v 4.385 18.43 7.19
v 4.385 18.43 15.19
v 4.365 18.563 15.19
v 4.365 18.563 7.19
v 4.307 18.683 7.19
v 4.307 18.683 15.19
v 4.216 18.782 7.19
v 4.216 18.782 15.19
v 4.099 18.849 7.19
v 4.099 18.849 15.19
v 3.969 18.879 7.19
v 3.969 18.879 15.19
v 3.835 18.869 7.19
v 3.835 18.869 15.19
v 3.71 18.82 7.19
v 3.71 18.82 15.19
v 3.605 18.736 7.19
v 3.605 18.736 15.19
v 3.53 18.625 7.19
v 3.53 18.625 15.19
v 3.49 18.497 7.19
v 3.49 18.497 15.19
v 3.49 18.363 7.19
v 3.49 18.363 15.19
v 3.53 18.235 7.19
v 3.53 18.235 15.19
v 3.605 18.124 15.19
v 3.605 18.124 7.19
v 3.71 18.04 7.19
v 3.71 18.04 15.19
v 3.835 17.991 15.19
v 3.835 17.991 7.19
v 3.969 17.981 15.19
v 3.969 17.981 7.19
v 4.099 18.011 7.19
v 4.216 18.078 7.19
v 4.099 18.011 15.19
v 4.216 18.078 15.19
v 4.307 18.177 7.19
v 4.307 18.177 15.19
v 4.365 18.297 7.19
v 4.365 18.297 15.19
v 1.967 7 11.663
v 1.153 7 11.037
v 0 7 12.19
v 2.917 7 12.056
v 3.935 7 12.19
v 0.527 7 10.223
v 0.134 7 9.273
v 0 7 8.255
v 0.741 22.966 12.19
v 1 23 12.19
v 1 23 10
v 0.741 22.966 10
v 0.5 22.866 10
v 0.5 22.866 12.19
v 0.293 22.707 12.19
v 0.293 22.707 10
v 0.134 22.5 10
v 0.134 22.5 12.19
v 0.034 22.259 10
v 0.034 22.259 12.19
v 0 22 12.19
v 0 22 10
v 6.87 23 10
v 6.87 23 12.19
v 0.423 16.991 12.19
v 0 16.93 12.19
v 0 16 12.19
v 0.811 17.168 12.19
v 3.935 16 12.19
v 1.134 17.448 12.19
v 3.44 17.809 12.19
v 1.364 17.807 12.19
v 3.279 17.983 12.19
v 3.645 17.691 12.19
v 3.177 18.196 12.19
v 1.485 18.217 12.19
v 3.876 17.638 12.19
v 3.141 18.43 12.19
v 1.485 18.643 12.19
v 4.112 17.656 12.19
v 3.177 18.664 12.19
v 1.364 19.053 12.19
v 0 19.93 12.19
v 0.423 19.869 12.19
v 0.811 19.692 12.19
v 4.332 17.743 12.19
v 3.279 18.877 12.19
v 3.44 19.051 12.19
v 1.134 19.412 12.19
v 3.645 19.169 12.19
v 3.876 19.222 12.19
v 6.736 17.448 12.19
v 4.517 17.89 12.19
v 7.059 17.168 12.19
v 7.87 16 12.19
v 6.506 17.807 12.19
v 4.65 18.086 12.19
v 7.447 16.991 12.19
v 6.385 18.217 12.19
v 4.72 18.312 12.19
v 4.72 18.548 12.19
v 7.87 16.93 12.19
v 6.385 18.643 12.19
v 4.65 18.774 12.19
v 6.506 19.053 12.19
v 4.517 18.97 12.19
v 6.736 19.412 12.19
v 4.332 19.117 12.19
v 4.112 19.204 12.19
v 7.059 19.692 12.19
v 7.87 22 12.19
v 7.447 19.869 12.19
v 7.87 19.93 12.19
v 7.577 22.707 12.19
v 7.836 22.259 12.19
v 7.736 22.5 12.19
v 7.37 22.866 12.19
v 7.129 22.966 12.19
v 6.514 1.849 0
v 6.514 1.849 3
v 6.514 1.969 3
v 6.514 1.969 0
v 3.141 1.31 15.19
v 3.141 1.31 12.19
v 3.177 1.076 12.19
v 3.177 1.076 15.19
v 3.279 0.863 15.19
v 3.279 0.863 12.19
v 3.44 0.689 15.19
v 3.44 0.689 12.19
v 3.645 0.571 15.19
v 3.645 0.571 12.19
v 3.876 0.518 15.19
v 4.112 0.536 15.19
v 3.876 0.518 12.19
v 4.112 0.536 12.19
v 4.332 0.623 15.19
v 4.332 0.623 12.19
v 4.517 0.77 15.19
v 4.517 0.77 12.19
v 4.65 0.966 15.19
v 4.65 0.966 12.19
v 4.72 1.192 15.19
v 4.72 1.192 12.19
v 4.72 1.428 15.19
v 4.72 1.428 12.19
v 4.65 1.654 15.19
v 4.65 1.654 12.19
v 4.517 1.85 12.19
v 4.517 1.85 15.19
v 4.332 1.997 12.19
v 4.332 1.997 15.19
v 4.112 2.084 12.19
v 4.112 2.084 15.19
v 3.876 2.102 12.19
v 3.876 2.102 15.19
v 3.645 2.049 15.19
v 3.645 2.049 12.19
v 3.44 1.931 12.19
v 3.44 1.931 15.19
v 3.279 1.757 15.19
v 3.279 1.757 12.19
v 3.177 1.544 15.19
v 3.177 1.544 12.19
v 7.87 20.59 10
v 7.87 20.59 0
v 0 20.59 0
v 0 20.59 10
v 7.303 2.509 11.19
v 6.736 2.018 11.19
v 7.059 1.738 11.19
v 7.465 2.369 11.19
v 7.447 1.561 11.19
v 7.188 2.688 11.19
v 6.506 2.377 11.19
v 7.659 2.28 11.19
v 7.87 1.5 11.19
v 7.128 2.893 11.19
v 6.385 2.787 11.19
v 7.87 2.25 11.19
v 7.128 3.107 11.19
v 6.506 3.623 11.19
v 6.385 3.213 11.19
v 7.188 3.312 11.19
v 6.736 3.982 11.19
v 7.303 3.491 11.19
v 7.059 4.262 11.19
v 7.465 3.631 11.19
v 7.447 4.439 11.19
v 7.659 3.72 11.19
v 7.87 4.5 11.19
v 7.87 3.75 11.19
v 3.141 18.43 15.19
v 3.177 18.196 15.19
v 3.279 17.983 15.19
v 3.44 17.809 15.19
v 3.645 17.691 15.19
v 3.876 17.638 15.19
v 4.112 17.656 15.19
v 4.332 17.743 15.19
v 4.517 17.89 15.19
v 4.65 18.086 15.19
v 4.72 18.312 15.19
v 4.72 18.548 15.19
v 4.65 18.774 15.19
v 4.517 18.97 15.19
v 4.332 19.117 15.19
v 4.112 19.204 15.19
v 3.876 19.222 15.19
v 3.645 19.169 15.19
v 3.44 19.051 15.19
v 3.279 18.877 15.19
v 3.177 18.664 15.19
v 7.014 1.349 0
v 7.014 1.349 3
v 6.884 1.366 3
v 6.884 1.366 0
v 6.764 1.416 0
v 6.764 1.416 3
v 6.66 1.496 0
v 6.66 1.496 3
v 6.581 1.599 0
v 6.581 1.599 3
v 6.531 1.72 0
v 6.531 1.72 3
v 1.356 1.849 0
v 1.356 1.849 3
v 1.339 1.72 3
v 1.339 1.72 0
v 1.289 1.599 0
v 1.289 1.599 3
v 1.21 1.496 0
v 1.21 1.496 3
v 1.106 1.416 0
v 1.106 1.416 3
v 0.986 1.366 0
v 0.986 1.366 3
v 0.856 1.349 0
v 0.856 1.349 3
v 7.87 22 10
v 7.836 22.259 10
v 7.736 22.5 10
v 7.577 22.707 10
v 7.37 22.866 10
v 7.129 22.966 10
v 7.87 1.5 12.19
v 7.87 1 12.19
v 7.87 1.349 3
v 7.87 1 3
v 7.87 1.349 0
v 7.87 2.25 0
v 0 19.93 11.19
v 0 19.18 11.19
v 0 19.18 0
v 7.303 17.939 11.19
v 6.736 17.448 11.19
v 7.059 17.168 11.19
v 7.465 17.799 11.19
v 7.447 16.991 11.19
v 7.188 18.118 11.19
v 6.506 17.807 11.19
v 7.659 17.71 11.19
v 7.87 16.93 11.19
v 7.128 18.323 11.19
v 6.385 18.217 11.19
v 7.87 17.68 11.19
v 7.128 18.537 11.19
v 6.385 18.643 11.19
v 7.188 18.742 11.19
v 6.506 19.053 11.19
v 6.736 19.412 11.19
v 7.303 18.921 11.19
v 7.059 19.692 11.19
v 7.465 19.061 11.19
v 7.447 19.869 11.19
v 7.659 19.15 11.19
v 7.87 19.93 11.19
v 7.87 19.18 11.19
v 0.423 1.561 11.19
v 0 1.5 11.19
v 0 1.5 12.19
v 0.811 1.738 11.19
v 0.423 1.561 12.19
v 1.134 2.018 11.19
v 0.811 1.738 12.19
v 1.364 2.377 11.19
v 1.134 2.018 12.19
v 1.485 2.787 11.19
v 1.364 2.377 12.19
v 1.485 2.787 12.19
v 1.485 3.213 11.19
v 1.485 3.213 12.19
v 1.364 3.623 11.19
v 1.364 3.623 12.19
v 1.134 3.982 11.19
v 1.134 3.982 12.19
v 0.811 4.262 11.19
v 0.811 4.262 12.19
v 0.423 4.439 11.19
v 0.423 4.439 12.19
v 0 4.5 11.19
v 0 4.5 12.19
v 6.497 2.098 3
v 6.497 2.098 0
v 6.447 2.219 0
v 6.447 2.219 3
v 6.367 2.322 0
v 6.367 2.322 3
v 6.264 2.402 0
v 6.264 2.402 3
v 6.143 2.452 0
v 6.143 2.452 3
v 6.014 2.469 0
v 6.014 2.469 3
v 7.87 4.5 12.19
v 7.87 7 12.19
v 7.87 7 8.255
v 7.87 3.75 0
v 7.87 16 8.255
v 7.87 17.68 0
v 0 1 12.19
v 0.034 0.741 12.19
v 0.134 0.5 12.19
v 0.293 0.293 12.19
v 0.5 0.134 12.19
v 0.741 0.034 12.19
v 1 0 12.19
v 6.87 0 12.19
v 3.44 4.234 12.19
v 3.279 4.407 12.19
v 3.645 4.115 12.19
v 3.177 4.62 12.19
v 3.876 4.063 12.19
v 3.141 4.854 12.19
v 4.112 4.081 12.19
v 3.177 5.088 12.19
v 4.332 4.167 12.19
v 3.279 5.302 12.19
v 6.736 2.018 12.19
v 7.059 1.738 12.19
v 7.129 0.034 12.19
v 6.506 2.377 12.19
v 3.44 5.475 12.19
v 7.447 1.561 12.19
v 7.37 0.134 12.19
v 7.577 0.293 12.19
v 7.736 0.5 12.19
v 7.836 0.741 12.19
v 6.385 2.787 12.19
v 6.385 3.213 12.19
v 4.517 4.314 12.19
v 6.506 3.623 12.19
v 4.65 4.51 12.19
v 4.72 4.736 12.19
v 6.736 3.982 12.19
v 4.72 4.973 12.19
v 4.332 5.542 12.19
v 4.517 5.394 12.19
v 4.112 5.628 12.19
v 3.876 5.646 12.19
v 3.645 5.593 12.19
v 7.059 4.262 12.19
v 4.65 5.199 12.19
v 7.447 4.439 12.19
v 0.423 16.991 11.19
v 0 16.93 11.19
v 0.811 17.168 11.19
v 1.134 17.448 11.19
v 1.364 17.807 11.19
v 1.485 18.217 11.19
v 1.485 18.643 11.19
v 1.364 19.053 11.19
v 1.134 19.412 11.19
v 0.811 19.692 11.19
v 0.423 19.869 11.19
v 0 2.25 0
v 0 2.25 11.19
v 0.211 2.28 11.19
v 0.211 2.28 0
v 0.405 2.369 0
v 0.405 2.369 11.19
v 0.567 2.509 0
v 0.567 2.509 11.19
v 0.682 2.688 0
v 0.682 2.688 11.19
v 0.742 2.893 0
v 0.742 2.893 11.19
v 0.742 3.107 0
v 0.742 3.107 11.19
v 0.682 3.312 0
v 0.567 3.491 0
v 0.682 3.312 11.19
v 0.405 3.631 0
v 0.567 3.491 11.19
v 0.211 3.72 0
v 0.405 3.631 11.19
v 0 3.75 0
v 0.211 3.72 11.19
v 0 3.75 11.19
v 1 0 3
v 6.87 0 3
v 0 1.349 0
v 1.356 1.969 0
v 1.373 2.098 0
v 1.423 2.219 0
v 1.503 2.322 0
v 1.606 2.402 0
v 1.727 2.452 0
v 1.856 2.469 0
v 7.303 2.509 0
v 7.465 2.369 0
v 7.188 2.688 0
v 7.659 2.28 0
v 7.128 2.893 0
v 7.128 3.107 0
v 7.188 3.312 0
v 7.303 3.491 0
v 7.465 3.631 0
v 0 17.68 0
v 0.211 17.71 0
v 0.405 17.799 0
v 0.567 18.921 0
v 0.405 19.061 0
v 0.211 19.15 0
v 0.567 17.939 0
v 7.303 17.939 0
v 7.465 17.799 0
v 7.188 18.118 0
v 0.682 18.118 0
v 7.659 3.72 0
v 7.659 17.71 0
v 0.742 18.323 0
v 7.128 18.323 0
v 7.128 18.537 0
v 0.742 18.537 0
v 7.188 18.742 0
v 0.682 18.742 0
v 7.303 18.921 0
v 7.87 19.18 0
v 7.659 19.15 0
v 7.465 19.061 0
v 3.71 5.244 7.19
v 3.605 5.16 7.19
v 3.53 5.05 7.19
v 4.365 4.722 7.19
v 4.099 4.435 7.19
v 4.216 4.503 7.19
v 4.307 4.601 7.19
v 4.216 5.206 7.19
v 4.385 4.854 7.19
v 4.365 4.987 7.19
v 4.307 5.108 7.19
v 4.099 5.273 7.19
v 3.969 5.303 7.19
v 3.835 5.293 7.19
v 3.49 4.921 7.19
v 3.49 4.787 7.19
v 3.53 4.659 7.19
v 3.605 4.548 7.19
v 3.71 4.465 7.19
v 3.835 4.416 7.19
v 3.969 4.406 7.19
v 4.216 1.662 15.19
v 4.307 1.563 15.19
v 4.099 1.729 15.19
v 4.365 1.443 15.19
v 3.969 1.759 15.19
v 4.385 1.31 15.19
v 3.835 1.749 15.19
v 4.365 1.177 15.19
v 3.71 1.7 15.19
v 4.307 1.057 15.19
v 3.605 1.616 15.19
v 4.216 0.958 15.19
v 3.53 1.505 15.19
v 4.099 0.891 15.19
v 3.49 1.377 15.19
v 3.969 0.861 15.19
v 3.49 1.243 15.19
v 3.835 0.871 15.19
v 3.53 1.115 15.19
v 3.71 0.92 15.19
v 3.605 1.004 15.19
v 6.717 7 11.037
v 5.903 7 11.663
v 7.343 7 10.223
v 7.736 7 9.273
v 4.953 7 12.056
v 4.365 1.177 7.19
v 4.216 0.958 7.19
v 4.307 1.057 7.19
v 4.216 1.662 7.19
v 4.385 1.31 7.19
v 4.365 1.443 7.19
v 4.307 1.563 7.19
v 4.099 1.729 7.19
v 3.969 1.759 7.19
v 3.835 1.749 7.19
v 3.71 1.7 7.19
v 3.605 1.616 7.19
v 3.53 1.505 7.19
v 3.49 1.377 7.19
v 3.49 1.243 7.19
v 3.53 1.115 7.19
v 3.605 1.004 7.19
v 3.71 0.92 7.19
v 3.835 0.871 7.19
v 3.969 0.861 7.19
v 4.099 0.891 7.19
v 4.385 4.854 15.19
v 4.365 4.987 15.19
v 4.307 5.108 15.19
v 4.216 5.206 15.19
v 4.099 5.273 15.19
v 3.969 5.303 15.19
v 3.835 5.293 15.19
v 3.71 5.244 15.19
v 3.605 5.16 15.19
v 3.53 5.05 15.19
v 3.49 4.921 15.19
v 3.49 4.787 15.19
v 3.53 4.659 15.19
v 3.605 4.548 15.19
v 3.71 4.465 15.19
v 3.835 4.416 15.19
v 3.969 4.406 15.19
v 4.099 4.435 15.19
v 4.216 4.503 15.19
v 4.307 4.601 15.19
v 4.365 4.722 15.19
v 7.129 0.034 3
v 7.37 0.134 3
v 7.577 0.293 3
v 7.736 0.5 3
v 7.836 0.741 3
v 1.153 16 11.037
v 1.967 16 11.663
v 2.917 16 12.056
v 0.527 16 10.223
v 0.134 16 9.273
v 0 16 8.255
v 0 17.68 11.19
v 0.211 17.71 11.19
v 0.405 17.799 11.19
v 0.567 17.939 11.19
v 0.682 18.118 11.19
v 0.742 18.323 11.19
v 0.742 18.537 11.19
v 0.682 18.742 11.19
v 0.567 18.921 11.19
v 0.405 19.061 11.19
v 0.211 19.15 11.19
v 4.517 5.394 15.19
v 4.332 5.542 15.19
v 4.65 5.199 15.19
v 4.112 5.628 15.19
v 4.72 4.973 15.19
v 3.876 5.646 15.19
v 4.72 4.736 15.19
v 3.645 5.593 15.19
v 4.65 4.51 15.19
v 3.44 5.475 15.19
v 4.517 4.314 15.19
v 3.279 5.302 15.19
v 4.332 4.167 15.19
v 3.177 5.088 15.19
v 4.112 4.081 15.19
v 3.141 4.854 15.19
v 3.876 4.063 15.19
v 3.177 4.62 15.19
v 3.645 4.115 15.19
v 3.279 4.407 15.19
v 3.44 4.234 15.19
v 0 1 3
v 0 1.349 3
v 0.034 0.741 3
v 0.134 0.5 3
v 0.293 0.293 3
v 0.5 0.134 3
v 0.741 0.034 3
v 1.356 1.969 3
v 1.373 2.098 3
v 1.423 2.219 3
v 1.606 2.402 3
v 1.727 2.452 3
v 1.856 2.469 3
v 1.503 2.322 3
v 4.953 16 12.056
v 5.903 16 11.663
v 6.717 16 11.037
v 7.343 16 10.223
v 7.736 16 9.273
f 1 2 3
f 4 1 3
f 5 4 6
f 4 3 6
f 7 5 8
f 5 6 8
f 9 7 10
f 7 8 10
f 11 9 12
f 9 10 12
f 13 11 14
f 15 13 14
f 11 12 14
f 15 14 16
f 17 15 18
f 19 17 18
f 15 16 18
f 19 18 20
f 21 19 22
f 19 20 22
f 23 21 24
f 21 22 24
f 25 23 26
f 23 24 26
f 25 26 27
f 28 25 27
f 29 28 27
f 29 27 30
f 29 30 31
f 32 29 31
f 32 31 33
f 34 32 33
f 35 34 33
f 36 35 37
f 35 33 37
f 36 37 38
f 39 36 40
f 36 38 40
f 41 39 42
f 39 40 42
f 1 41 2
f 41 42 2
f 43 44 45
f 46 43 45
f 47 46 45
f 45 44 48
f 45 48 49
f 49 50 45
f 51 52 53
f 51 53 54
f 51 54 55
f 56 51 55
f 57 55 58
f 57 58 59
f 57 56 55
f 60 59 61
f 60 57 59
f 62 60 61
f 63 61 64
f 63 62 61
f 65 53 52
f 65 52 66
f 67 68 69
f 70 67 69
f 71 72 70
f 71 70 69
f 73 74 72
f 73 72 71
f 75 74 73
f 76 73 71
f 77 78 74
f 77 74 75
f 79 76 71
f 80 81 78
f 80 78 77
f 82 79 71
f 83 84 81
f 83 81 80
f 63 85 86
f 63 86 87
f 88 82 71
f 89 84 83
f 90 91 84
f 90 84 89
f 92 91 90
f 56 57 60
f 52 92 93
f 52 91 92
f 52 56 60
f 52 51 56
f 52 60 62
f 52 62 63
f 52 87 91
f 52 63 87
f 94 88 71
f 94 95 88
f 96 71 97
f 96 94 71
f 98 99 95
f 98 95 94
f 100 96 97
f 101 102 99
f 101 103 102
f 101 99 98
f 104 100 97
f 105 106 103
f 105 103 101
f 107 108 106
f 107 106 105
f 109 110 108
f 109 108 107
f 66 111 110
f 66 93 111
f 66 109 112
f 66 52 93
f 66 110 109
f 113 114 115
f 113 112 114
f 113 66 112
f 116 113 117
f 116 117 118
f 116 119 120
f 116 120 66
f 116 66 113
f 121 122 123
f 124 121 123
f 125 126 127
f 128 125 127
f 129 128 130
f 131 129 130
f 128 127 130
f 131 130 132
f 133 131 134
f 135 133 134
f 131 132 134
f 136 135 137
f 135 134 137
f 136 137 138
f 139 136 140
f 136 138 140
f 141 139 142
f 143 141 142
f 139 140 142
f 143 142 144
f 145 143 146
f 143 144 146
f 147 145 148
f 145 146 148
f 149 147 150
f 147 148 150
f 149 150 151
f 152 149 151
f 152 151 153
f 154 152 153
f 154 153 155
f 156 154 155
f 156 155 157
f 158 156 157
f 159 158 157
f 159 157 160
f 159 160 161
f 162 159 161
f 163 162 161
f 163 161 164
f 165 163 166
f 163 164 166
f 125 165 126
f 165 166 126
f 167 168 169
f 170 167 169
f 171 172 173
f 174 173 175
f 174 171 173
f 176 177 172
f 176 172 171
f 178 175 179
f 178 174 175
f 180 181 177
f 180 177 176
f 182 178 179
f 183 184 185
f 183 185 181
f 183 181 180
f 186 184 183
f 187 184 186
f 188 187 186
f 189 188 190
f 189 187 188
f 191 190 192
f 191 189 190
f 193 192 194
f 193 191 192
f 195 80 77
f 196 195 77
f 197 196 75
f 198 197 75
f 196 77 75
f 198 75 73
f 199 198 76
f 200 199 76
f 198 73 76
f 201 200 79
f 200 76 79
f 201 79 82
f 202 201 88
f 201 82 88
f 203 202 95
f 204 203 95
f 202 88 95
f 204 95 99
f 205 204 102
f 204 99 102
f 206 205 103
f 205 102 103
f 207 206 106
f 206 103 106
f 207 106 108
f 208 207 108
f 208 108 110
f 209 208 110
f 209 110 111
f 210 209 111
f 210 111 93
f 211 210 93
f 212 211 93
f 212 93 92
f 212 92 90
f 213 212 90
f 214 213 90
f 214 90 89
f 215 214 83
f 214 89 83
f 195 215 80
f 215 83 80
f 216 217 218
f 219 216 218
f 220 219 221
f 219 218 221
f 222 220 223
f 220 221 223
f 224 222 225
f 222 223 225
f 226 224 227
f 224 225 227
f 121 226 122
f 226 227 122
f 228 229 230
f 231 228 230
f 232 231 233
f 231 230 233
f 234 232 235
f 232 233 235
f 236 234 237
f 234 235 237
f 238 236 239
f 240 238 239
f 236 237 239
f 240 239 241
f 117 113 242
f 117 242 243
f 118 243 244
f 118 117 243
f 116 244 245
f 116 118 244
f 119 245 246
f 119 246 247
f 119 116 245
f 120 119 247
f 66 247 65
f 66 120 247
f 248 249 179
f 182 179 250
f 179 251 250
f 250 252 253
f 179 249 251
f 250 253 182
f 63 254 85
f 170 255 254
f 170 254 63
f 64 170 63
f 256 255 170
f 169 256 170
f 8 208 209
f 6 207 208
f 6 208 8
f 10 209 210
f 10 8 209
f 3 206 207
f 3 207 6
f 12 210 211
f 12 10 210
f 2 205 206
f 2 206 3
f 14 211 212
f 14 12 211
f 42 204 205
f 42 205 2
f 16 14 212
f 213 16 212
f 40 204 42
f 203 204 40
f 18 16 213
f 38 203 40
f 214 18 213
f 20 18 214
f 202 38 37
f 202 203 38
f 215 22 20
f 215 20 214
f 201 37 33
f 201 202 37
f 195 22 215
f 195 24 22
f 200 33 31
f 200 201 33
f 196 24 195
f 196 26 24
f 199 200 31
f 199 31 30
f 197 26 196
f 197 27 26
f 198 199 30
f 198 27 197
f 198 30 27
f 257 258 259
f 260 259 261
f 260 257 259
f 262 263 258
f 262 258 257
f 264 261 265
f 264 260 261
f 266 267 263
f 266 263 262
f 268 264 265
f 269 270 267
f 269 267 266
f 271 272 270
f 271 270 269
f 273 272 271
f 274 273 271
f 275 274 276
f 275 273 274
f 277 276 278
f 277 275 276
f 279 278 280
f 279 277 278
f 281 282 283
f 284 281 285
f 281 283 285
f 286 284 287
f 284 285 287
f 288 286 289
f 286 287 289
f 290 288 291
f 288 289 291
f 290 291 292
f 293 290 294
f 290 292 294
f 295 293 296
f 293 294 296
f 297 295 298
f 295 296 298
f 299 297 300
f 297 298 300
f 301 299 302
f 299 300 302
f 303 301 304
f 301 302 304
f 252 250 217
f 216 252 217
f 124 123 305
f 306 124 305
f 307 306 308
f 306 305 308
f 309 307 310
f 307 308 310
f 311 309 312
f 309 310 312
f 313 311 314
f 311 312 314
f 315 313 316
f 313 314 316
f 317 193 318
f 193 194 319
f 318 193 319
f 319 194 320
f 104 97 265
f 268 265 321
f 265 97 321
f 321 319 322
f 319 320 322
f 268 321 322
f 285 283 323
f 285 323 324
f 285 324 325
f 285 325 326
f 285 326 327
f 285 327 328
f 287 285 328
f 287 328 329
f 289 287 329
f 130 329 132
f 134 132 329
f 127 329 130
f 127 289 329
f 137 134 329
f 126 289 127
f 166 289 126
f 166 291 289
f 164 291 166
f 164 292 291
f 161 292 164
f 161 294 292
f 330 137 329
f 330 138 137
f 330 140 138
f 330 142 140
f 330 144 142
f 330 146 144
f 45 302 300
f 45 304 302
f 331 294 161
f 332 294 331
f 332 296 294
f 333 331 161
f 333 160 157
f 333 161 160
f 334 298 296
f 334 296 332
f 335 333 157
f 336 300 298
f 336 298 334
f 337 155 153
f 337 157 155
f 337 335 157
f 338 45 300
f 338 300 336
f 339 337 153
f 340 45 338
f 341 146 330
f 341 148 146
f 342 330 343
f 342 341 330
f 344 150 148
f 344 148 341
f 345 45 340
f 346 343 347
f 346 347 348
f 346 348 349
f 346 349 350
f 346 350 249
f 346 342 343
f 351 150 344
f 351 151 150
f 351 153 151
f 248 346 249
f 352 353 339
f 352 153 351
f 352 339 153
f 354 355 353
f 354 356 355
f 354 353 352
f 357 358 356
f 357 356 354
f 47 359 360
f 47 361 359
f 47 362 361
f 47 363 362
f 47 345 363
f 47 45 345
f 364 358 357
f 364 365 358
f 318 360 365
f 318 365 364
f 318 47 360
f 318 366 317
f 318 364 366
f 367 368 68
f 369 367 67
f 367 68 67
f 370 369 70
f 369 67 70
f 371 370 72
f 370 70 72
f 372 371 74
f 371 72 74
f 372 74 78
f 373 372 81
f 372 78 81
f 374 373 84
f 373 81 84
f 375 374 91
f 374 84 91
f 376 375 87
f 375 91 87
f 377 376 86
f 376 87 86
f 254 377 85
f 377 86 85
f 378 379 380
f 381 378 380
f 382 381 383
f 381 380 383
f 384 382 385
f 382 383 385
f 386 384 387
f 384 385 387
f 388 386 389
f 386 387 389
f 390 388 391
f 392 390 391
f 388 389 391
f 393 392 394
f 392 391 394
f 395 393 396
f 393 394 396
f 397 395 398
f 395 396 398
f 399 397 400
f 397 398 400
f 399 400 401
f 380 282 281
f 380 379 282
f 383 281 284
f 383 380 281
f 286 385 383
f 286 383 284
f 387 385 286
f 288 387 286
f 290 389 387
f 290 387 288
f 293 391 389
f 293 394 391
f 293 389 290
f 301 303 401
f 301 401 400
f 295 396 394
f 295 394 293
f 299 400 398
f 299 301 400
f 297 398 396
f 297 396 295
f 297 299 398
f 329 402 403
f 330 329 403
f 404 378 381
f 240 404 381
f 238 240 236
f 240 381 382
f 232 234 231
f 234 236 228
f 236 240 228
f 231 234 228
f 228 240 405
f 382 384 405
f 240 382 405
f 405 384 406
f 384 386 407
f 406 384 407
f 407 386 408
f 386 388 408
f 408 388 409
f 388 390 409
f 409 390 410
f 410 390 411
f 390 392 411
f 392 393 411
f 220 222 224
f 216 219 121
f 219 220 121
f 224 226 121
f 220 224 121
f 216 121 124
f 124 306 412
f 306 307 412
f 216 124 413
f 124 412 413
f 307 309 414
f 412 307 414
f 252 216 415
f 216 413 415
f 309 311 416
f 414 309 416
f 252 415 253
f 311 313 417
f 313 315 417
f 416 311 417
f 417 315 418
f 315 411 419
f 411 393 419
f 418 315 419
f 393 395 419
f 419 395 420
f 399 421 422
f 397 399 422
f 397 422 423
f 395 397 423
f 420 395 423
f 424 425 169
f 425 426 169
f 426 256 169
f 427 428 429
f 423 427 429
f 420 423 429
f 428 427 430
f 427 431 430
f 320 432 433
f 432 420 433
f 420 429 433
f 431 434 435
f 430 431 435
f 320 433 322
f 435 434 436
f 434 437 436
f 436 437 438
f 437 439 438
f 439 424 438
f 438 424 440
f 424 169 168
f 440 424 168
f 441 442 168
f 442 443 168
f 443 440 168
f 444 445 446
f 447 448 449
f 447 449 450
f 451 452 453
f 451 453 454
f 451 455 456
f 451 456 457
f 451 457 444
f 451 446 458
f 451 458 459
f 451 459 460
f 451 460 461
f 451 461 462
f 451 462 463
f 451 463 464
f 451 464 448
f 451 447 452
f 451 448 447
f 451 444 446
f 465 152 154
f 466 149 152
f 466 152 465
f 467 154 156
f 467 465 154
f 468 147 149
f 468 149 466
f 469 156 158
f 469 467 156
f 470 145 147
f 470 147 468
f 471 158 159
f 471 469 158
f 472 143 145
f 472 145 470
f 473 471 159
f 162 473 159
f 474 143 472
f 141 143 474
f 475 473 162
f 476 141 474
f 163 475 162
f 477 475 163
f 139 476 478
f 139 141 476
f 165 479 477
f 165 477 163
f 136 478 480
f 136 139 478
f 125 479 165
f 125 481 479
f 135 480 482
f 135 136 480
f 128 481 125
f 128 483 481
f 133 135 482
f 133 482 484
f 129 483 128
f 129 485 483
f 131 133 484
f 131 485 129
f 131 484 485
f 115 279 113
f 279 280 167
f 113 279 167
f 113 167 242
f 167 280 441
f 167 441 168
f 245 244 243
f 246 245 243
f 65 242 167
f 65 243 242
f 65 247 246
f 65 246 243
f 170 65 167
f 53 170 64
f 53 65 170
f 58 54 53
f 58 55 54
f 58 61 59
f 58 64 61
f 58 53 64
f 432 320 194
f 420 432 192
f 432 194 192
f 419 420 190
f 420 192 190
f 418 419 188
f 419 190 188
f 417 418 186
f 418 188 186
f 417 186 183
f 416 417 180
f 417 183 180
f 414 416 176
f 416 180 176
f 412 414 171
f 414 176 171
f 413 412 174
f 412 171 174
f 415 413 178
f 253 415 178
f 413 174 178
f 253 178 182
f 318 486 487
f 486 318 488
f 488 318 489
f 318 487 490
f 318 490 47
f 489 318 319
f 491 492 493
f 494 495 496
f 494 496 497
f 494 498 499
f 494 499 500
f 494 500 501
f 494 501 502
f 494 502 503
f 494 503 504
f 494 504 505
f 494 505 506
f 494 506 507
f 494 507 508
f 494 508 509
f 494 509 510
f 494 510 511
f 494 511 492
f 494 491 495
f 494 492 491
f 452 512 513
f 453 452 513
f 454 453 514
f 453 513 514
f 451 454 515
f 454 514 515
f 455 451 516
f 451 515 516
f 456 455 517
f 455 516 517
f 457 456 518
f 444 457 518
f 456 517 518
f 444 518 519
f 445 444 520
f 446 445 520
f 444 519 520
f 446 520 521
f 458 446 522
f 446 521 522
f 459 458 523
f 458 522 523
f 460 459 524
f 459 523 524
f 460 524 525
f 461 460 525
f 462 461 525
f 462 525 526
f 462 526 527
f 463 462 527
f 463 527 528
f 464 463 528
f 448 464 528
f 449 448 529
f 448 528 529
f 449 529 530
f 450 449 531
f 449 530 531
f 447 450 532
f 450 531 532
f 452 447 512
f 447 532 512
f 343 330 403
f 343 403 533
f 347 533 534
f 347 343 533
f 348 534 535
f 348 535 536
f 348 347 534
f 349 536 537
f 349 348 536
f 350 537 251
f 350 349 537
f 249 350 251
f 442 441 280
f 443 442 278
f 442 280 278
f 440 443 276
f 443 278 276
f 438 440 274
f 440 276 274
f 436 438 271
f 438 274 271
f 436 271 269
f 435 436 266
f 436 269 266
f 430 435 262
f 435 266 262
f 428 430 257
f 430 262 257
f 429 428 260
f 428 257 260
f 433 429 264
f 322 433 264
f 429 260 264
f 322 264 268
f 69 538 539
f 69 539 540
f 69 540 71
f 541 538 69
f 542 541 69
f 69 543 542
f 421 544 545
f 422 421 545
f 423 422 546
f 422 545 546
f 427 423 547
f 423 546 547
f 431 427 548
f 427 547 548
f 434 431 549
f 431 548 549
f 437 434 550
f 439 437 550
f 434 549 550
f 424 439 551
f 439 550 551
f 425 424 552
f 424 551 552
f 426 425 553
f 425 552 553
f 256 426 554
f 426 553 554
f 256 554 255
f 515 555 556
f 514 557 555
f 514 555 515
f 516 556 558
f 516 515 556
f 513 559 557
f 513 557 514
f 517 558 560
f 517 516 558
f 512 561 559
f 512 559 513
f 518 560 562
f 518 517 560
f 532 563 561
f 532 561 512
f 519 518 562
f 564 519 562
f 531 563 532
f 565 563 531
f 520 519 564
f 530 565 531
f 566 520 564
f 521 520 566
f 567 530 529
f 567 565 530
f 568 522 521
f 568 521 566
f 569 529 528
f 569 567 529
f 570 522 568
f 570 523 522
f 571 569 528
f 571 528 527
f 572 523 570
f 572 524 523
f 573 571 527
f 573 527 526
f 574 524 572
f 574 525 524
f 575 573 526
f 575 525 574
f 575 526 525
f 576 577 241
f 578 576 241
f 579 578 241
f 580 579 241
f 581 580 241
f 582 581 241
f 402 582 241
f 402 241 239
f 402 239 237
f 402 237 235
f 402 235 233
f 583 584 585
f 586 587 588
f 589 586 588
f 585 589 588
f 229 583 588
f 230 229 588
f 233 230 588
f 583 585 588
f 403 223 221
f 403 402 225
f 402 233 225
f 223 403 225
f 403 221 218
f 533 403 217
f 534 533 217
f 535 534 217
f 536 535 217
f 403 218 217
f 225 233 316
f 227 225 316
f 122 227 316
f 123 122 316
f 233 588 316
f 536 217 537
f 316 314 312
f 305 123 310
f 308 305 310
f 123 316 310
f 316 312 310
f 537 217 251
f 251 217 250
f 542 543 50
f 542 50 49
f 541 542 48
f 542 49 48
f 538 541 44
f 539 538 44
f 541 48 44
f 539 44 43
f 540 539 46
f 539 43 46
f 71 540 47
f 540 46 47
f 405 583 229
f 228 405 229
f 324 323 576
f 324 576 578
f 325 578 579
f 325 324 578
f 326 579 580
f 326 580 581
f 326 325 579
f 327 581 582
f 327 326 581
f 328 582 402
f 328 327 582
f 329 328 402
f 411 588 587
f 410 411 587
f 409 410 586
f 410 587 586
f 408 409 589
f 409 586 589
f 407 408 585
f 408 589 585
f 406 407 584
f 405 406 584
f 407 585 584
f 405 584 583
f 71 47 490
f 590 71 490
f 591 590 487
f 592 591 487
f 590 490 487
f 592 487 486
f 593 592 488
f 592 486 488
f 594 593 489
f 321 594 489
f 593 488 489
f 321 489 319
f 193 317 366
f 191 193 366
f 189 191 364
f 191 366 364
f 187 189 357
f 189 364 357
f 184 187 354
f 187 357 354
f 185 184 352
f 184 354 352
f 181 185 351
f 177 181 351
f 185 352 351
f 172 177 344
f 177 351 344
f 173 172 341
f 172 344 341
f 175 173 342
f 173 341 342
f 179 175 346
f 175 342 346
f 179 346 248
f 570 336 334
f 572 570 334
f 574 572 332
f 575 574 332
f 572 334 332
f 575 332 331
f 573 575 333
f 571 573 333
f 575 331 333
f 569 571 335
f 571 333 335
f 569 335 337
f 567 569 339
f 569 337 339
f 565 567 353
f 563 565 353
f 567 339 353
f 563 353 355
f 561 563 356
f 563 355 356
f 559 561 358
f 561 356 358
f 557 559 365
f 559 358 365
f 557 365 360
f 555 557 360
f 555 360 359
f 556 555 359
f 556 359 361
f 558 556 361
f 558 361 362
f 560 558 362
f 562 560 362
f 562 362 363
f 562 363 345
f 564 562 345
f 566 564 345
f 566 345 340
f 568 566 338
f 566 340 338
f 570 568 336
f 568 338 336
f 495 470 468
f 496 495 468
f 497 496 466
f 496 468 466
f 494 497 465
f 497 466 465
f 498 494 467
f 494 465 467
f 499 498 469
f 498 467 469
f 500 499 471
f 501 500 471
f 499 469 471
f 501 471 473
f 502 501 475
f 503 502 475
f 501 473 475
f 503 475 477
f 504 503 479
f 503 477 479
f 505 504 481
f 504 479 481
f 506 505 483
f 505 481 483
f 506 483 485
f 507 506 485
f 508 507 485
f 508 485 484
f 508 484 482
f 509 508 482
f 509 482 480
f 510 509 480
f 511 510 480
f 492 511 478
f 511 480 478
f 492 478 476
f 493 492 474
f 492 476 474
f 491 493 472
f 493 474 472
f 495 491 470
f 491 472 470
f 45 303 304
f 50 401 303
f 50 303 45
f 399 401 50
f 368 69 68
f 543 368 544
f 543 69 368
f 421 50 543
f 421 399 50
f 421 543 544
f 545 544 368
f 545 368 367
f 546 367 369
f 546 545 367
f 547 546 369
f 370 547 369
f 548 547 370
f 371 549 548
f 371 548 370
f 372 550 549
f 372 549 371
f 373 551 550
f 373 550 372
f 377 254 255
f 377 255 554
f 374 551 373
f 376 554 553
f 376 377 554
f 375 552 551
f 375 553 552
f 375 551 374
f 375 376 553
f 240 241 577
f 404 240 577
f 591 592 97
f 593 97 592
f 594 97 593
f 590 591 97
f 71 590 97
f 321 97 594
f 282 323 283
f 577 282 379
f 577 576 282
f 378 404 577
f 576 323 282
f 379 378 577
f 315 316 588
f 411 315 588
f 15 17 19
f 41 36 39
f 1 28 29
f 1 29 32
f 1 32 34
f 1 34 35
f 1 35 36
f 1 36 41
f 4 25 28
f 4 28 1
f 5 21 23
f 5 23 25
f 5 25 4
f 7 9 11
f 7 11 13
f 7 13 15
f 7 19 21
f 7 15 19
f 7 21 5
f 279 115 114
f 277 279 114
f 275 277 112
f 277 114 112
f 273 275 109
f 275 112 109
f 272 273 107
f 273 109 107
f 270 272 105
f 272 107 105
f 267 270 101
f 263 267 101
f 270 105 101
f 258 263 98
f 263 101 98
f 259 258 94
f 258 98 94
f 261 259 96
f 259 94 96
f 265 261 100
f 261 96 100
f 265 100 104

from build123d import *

# Parameters (mm, degrees)
SKETCH1_W           = 7.87
SKETCH1_H           = 23
BOSS_EXTRUDE1_DEPTH = 12.19
SKETCH2_R           = 0.79375
BOSS_EXTRUDE2_DEPTH = 3
SKETCH3_R           = 0.75
CUT_EXTRUDE1_DEPTH  = 12.19
FILLET1_R           = 1
SKETCH4_R           = 1.5
CUT_EXTRUDE2_DEPTH  = 1
SKETCH5_W           = 7.87
SKETCH5_H           = 2.41
CUT_EXTRUDE3_DEPTH  = 10
CUT_EXTRUDE4_START  = -3
CUT_EXTRUDE4_DEPTH  = 3
SKETCH7_R           = 0.45
CUT_EXTRUDE5_DEPTH  = 8
CUT_EXTRUDE6_DEPTH  = 9


with BuildPart() as part:
    # Sketch1 → Boss-Extrude1 (new body)
    with BuildSketch(Plane.XY):
        with Locations((3.935, 11.5)):
            Rectangle(SKETCH1_W, SKETCH1_H)
    extrude(amount=BOSS_EXTRUDE1_DEPTH)

    # Sketch2 → Boss-Extrude2 (add)
    with BuildSketch(Plane.XY.offset(12.19)):
        with Locations(Location((3.935, 18.43, 0), (0, 0, 180))):
            Circle(SKETCH2_R)
        with Locations(Location((3.935, 4.854367324, 0), (0, 0, 180))):
            Circle(SKETCH2_R)
        with Locations(Location((3.935, 1.31, 0), (0, 0, 180))):
            Circle(SKETCH2_R)
    extrude(amount=BOSS_EXTRUDE2_DEPTH)

    # Sketch3 → Cut-Extrude1 (cut)
    with BuildSketch(Plane.XY.offset(12.19)):
        with Locations((0, 18.43)):
            Circle(SKETCH3_R)
        with Locations((0, 3)):
            Circle(SKETCH3_R)
        with Locations((7.87, 3)):
            Circle(SKETCH3_R)
        with Locations((7.87, 18.43)):
            Circle(SKETCH3_R)
    extrude(amount=-CUT_EXTRUDE1_DEPTH, mode=Mode.SUBTRACT)

    # Fillet1
    fillet1_edges = [part.edges().sort_by_distance(p)[0] for p in [
        (0, 23, 6.095),
        (7.87, 23, 6.095),
        (7.87, 0, 6.095),
        (0, 0, 6.095),
    ]]
    fillet(fillet1_edges, radius=FILLET1_R)

    # Sketch4 → Cut-Extrude2 (cut)
    with BuildSketch(Plane.XY.offset(12.19)):
        with Locations((0, 18.43)):
            Circle(SKETCH4_R)
        with Locations((0, 3)):
            Circle(SKETCH4_R)
        with Locations((7.87, 3)):
            Circle(SKETCH4_R)
        with Locations((7.87, 18.43)):
            Circle(SKETCH4_R)
    extrude(amount=-CUT_EXTRUDE2_DEPTH, mode=Mode.SUBTRACT)

    # Sketch5 → Cut-Extrude3 (cut)
    with BuildSketch(Plane(origin=(0, 0, 0), x_dir=(-1, 0, 0), z_dir=(0, 0, -1))):
        with Locations((-3.935, 21.795)):
            Rectangle(SKETCH5_W, SKETCH5_H)
    extrude(amount=-CUT_EXTRUDE3_DEPTH, mode=Mode.SUBTRACT)

    # Sketch6 → Cut-Extrude4 (cut)
    with BuildSketch(Plane(origin=(0, 0, 0), x_dir=(-1, 0, 0), z_dir=(0, 0, -1)).offset(CUT_EXTRUDE4_START)):
        with BuildLine():
            Line((-7.87, 1.349131469), (-7.01383854, 1.349131469))
            ThreePointArc((-7.01383854, 1.349131469), (-6.660285149, 1.495578078), (-6.51383854, 1.849131469))
            Line((-6.51383854, 1.849131469), (-6.51383854, 1.968890308))
            ThreePointArc((-6.51383854, 1.968890308), (-6.36739193, 2.322443699), (-6.01383854, 2.468890308))
            Line((-6.01383854, 2.468890308), (-1.85616146, 2.468890308))
            ThreePointArc((-1.85616146, 2.468890308), (-1.50260807, 2.322443699), (-1.35616146, 1.968890308))
            Line((-1.35616146, 1.968890308), (-1.35616146, 1.849131469))
            ThreePointArc((-1.35616146, 1.849131469), (-1.209714851, 1.495578078), (-0.85616146, 1.349131469))
            Line((-0.85616146, 1.349131469), (0, 1.349131469))
            Line((0, 1.349131469), (0, 1))
            ThreePointArc((0, 1), (-0.292893219, 0.292893219), (-1, 0))
            Line((-1, 0), (-6.87, 0))
            ThreePointArc((-6.87, 0), (-7.577106781, 0.292893219), (-7.87, 1))
            Line((-7.87, 1), (-7.87, 1.349131469))
        make_face()
    extrude(amount=CUT_EXTRUDE4_DEPTH, mode=Mode.SUBTRACT)

    # Sketch7 → Cut-Extrude5 (cut)
    with BuildSketch(Plane.XY.offset(15.19)):
        with Locations((3.935, 18.43)):
            Circle(SKETCH7_R)
        with Locations((3.935, 4.854367324)):
            Circle(SKETCH7_R)
        with Locations((3.935, 1.31)):
            Circle(SKETCH7_R)
    extrude(amount=-CUT_EXTRUDE5_DEPTH, mode=Mode.SUBTRACT)

    # Sketch8 → Cut-Extrude6 (cut)
    with BuildSketch(Plane(origin=(0, 7, 0), x_dir=(-1, 0, 0), z_dir=(0, -1, 0))):
        with BuildLine():
            Line((0, -12.19), (0, -8.255))
            ThreePointArc((0, -8.255), (-1.152534816, -11.037465184), (-3.935, -12.19))
            Line((-3.935, -12.19), (0, -12.19))
        make_face()
        with BuildLine():
            Line((-7.87, -12.19), (-3.935, -12.19))
            ThreePointArc((-3.935, -12.19), (-6.717465184, -11.037465184), (-7.87, -8.255))
            Line((-7.87, -8.255), (-7.87, -12.19))
        make_face()
    extrude(amount=-CUT_EXTRUDE6_DEPTH, mode=Mode.SUBTRACT)


solid = part.part
